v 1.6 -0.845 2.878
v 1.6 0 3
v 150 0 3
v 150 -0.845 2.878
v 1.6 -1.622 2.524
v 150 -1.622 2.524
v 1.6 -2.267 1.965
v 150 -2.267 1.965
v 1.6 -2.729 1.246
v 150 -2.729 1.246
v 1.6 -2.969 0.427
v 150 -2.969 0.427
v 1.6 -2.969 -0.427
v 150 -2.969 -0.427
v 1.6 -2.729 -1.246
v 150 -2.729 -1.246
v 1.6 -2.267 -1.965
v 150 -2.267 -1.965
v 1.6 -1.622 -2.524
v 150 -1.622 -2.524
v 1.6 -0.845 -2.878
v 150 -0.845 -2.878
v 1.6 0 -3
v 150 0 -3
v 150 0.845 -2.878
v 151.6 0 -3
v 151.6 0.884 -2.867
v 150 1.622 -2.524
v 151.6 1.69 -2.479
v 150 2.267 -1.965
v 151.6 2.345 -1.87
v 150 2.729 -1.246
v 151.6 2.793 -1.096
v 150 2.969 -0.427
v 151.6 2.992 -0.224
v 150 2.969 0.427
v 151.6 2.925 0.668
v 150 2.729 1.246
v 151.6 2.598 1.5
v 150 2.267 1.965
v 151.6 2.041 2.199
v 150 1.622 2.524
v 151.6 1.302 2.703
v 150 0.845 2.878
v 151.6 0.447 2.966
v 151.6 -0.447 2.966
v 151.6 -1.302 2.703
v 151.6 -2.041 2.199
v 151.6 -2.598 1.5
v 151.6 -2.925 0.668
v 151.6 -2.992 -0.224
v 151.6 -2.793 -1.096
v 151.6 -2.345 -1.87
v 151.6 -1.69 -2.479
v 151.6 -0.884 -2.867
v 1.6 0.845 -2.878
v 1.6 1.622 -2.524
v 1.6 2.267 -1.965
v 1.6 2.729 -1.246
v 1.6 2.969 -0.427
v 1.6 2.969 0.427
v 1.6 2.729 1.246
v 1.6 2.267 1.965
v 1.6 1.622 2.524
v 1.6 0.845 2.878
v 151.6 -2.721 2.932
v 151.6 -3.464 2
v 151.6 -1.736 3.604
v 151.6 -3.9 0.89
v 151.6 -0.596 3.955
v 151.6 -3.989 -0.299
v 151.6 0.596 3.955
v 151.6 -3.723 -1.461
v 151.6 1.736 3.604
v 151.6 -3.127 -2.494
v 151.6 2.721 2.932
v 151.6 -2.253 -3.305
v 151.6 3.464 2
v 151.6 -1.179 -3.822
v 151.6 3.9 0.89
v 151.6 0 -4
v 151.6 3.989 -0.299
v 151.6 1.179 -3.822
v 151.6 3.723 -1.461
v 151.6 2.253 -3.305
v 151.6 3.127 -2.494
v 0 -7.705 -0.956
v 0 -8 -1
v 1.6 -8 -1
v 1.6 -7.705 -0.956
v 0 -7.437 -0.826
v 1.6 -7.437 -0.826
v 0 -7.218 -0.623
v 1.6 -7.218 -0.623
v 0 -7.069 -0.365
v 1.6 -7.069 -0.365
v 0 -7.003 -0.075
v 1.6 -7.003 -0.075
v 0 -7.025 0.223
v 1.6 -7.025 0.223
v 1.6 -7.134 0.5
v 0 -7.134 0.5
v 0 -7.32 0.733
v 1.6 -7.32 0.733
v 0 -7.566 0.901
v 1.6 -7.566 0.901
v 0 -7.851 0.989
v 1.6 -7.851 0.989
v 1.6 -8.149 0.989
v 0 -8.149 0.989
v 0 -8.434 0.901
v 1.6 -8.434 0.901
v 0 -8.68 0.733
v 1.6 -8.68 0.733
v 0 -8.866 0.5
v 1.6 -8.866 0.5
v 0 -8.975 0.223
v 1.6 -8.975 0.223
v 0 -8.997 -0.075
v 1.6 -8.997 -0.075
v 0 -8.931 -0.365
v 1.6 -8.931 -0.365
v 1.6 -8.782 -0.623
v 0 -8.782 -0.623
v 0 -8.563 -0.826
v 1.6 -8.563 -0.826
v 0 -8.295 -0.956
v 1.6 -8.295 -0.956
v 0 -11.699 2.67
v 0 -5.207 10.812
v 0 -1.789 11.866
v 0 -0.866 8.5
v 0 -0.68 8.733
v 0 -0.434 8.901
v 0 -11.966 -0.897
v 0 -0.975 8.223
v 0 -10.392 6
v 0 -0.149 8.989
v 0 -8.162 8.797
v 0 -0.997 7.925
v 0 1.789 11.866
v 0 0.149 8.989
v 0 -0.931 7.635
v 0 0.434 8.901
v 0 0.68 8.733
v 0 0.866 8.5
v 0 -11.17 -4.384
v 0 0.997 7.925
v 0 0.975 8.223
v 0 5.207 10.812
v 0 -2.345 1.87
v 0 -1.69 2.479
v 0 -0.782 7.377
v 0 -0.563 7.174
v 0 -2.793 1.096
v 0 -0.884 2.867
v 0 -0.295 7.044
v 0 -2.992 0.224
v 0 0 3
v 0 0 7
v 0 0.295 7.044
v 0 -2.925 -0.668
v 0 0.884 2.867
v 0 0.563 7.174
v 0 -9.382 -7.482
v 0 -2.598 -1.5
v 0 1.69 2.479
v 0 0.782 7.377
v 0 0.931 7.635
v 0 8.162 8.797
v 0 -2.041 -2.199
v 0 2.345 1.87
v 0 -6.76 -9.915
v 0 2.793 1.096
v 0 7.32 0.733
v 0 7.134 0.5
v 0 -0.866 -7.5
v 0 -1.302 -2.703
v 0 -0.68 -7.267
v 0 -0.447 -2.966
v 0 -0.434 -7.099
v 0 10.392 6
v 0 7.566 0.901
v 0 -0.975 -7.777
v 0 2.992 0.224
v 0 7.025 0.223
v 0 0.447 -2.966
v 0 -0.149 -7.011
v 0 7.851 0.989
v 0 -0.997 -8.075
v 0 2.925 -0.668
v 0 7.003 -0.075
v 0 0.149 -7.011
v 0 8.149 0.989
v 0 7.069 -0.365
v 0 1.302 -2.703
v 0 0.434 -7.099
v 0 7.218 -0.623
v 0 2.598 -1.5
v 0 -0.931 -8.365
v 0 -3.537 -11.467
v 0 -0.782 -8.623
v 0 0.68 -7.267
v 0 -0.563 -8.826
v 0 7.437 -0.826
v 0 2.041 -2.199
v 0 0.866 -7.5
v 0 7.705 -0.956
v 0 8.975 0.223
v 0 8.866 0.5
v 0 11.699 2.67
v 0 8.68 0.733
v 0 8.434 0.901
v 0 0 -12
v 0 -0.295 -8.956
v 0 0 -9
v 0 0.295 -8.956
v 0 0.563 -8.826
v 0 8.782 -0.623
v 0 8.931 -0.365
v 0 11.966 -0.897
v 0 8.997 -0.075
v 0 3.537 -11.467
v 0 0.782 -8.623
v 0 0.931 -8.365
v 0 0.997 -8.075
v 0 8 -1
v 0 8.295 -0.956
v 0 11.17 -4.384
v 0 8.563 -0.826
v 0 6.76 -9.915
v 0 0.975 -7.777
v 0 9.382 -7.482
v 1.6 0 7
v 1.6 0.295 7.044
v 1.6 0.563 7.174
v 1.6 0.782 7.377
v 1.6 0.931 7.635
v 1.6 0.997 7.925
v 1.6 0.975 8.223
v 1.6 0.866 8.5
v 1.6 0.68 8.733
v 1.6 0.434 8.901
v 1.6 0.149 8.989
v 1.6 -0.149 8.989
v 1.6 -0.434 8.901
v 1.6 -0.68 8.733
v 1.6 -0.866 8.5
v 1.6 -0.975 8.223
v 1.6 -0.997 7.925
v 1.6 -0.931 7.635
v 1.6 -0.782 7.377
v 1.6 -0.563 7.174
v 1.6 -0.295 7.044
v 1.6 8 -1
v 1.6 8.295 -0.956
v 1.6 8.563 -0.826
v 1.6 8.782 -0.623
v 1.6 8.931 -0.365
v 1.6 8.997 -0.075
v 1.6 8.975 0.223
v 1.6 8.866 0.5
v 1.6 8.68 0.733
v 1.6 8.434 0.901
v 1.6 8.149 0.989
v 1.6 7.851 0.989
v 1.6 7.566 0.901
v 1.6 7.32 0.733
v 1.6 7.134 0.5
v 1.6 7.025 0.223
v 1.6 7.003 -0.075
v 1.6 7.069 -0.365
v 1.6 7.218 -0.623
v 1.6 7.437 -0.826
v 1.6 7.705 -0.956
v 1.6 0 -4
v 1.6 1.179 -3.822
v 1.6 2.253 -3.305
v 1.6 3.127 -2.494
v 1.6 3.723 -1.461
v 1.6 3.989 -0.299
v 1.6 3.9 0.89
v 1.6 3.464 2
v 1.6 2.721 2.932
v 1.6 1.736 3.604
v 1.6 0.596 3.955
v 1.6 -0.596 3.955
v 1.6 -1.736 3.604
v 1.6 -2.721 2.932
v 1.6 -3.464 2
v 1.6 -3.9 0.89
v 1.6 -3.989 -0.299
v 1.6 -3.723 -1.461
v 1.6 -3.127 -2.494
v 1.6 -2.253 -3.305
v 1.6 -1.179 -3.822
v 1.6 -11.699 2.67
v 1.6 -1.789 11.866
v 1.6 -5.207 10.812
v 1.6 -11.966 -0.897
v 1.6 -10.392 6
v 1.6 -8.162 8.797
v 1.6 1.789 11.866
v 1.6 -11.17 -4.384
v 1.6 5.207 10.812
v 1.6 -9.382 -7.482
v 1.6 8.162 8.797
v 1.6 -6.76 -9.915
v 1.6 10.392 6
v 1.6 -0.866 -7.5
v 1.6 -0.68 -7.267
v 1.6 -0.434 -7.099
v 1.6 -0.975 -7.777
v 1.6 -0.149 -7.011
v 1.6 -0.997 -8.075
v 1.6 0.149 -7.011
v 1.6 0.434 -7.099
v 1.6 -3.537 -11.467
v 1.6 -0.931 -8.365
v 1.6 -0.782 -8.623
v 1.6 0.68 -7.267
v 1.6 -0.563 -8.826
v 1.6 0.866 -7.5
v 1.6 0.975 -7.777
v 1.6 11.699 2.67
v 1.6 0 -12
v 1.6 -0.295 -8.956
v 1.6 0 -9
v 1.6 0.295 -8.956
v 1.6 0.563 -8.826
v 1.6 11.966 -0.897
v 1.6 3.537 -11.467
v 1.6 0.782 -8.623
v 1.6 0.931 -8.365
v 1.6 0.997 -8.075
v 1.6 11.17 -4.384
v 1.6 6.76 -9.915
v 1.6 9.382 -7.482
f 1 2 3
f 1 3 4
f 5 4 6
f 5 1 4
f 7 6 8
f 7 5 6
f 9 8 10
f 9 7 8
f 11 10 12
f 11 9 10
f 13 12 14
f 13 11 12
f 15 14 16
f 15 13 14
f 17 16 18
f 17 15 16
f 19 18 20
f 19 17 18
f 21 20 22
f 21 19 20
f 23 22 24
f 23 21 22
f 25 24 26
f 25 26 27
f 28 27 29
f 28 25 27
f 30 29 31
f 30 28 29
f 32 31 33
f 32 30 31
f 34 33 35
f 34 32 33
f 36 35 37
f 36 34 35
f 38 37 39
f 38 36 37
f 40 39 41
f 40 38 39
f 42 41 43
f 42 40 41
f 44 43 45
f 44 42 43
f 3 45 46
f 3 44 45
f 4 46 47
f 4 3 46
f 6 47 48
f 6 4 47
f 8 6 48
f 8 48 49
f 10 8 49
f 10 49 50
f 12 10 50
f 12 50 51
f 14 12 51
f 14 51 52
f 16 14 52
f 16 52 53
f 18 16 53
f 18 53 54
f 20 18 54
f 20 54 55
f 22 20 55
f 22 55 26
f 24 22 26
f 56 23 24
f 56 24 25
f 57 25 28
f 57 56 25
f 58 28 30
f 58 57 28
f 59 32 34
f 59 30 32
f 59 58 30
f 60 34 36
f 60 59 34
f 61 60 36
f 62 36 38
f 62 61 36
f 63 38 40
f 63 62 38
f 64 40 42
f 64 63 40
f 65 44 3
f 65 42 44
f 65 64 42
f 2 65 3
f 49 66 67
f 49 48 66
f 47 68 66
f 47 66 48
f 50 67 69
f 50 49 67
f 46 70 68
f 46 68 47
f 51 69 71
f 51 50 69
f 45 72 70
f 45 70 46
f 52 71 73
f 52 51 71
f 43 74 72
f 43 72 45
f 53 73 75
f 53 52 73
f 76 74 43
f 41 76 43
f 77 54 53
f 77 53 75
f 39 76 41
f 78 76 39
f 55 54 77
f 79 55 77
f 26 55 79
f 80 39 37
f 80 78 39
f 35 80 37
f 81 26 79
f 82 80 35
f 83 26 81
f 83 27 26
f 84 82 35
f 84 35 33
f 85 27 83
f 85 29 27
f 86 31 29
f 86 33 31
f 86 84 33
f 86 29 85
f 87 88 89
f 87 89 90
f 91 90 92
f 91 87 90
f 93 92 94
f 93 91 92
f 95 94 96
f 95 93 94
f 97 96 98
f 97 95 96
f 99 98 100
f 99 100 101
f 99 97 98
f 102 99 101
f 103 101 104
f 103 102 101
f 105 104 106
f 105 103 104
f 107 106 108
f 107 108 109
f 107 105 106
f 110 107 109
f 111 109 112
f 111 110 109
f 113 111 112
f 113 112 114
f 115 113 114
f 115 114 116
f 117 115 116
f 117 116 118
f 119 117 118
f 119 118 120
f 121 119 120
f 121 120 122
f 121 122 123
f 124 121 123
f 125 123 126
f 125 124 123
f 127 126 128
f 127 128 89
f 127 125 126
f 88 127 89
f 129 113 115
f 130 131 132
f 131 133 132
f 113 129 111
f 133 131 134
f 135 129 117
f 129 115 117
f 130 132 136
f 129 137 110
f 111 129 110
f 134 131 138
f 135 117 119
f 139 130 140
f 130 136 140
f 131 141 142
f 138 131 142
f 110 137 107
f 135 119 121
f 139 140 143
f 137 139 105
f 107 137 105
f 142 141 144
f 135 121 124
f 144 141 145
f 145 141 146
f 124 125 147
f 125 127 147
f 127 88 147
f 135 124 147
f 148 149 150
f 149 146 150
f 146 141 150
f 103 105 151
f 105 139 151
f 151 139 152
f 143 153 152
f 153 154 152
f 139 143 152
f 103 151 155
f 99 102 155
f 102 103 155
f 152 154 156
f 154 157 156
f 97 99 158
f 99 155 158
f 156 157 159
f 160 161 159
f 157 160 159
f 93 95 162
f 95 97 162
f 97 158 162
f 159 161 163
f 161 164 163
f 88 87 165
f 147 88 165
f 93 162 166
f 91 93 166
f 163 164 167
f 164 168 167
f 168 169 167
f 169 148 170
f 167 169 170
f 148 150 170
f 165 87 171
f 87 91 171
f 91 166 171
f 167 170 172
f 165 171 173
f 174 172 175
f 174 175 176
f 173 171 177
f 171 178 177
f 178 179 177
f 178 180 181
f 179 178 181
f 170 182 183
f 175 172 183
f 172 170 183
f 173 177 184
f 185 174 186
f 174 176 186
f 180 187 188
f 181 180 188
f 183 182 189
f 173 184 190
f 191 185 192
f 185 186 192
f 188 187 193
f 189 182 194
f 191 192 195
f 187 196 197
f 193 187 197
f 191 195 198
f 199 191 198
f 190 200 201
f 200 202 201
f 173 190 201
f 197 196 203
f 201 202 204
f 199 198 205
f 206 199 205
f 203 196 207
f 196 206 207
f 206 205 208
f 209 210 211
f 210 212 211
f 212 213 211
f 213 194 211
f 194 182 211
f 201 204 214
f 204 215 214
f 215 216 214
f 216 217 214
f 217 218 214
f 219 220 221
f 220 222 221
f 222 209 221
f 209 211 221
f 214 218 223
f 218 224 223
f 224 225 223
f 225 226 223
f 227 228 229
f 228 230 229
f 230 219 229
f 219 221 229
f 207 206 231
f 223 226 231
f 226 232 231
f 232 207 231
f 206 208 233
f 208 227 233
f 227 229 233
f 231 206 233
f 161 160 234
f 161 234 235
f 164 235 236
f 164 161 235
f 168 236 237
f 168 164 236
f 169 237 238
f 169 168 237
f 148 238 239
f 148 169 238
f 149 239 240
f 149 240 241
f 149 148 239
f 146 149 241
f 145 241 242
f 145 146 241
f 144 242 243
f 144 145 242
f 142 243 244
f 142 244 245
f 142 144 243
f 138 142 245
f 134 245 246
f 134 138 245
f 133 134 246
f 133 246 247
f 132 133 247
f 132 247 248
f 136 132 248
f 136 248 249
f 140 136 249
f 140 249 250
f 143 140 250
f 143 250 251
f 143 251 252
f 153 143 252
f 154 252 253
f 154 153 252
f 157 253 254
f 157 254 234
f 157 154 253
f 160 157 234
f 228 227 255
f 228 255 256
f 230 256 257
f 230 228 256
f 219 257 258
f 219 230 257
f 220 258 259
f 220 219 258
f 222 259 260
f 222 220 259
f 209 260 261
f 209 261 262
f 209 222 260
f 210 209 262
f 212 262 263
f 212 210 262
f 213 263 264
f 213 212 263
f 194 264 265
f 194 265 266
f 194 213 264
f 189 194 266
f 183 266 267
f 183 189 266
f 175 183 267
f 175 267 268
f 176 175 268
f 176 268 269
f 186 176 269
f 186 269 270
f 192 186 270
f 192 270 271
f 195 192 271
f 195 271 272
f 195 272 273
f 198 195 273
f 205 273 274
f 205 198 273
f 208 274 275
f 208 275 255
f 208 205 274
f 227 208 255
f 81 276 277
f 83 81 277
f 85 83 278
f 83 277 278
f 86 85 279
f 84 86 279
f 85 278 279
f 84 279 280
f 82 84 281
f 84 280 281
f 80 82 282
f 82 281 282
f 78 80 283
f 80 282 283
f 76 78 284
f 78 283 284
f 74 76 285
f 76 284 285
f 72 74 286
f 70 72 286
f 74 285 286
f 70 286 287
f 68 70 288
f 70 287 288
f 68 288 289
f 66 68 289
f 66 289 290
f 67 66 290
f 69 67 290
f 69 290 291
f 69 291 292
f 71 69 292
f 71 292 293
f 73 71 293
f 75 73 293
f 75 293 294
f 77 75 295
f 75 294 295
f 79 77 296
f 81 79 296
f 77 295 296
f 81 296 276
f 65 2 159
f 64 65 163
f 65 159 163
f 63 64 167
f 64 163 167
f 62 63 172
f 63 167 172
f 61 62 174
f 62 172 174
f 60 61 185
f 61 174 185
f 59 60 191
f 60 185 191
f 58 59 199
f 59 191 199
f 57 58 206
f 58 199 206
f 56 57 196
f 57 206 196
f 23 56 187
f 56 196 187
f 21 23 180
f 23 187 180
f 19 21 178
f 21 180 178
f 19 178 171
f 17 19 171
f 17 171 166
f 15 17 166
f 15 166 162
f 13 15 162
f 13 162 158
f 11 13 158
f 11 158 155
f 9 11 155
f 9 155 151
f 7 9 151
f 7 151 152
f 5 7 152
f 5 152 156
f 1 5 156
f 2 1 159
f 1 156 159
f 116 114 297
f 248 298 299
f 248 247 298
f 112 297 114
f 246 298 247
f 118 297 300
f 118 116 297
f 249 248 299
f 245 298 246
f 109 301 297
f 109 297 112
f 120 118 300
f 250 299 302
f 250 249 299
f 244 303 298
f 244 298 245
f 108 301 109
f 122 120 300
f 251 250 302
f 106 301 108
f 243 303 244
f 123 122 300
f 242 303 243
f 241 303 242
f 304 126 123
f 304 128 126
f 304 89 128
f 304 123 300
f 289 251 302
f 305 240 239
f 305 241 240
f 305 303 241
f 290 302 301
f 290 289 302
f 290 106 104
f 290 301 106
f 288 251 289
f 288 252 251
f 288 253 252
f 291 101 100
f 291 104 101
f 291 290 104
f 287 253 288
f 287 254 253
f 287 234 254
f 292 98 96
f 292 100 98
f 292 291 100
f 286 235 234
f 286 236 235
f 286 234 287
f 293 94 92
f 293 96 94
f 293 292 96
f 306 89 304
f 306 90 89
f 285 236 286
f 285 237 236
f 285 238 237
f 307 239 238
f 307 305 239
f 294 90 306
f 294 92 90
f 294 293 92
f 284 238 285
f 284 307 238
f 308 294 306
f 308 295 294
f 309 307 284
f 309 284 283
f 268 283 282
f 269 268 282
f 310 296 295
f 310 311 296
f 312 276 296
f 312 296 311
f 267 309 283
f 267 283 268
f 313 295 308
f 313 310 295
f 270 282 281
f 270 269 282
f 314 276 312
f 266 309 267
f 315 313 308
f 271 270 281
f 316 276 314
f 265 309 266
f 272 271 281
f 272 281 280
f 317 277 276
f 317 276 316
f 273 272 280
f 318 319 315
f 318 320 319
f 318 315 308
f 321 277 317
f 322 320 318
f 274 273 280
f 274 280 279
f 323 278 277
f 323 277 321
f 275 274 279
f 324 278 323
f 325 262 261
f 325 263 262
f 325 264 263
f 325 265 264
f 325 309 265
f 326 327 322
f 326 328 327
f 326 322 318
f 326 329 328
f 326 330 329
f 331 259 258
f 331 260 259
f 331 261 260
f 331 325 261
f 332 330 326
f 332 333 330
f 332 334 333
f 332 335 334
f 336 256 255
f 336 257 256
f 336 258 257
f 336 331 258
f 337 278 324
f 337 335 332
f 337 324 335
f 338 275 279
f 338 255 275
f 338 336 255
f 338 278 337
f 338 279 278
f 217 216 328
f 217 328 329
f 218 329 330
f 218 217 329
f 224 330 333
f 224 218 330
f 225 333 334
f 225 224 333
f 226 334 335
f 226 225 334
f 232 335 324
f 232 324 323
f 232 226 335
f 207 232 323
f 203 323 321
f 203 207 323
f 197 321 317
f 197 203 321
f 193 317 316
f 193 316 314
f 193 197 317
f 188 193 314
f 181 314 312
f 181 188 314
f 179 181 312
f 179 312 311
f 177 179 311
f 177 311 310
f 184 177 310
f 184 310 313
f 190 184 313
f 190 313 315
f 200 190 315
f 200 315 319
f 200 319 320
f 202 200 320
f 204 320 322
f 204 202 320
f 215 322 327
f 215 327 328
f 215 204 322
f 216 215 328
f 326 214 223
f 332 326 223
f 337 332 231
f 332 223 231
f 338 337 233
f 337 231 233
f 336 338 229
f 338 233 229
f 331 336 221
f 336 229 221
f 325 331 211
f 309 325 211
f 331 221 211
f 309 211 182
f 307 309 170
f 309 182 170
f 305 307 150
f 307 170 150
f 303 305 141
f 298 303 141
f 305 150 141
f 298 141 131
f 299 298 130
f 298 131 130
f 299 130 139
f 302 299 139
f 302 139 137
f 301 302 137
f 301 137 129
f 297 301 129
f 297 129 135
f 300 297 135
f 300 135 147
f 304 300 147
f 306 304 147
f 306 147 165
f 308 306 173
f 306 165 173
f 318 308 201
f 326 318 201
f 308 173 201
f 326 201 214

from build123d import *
from build123d.topology import SkipClean

# Parameters (mm, degrees)
SKETCH1_R           = 12
SKETCH1_R_2         = 1
SKETCH1_R_3         = 4
SKETCH1_R_4         = 3
BOSS_EXTRUDE1_DEPTH = 1.6
SKETCH2_R           = 4
SKETCH2_R_2         = 3
BOSS_EXTRUDE2_DEPTH = 150
SKETCH3_R           = 3
CUT_EXTRUDE1_DEPTH  = 150


with BuildPart() as part:
    # Sketch1 → Boss-Extrude1 (new body)
    # profile 1 of 3: a face of its own
    with BuildSketch(Plane(origin=(0, 0, 0), x_dir=(0, 0, -1), z_dir=(1, 0, 0))):
        Circle(SKETCH1_R)
        with Locations((-8, 0)):
            Circle(SKETCH1_R_2, mode=Mode.SUBTRACT)
        with Locations((0, -8)):
            Circle(SKETCH1_R_2, mode=Mode.SUBTRACT)
        with Locations((8, 0)):
            Circle(SKETCH1_R_2, mode=Mode.SUBTRACT)
        with Locations((0, 8)):
            Circle(SKETCH1_R_2, mode=Mode.SUBTRACT)
        Circle(SKETCH1_R_3, mode=Mode.SUBTRACT)
    # profile 2 of 3: a face of its own
    with BuildSketch(Plane(origin=(0, 0, 0), x_dir=(0, 0, -1), z_dir=(1, 0, 0))):
        Circle(SKETCH1_R_3)
        Circle(SKETCH1_R_4, mode=Mode.SUBTRACT)
    # profile 3 of 3: a face of its own
    with BuildSketch(Plane(origin=(0, 0, 0), x_dir=(0, 0, -1), z_dir=(1, 0, 0))):
        Circle(SKETCH1_R_4)
    extrude(amount=BOSS_EXTRUDE1_DEPTH)

    # Sketch2 → Boss-Extrude2 (add)
    with BuildSketch(Plane(origin=(1.6, 0, 0), x_dir=(0, 0, -1), z_dir=(1, 0, 0))):
        Circle(SKETCH2_R)
        Circle(SKETCH2_R_2, mode=Mode.SUBTRACT)
    extrude(amount=BOSS_EXTRUDE2_DEPTH)

    # Sketch3 → Cut-Extrude1 (cut)
    with SkipClean():  # the faces are left unmerged after this step: merging them gives an invalid solid
        with BuildSketch(Plane.ZY):
            Circle(SKETCH3_R)
        extrude(amount=-CUT_EXTRUDE1_DEPTH, mode=Mode.SUBTRACT)


solid = part.part
